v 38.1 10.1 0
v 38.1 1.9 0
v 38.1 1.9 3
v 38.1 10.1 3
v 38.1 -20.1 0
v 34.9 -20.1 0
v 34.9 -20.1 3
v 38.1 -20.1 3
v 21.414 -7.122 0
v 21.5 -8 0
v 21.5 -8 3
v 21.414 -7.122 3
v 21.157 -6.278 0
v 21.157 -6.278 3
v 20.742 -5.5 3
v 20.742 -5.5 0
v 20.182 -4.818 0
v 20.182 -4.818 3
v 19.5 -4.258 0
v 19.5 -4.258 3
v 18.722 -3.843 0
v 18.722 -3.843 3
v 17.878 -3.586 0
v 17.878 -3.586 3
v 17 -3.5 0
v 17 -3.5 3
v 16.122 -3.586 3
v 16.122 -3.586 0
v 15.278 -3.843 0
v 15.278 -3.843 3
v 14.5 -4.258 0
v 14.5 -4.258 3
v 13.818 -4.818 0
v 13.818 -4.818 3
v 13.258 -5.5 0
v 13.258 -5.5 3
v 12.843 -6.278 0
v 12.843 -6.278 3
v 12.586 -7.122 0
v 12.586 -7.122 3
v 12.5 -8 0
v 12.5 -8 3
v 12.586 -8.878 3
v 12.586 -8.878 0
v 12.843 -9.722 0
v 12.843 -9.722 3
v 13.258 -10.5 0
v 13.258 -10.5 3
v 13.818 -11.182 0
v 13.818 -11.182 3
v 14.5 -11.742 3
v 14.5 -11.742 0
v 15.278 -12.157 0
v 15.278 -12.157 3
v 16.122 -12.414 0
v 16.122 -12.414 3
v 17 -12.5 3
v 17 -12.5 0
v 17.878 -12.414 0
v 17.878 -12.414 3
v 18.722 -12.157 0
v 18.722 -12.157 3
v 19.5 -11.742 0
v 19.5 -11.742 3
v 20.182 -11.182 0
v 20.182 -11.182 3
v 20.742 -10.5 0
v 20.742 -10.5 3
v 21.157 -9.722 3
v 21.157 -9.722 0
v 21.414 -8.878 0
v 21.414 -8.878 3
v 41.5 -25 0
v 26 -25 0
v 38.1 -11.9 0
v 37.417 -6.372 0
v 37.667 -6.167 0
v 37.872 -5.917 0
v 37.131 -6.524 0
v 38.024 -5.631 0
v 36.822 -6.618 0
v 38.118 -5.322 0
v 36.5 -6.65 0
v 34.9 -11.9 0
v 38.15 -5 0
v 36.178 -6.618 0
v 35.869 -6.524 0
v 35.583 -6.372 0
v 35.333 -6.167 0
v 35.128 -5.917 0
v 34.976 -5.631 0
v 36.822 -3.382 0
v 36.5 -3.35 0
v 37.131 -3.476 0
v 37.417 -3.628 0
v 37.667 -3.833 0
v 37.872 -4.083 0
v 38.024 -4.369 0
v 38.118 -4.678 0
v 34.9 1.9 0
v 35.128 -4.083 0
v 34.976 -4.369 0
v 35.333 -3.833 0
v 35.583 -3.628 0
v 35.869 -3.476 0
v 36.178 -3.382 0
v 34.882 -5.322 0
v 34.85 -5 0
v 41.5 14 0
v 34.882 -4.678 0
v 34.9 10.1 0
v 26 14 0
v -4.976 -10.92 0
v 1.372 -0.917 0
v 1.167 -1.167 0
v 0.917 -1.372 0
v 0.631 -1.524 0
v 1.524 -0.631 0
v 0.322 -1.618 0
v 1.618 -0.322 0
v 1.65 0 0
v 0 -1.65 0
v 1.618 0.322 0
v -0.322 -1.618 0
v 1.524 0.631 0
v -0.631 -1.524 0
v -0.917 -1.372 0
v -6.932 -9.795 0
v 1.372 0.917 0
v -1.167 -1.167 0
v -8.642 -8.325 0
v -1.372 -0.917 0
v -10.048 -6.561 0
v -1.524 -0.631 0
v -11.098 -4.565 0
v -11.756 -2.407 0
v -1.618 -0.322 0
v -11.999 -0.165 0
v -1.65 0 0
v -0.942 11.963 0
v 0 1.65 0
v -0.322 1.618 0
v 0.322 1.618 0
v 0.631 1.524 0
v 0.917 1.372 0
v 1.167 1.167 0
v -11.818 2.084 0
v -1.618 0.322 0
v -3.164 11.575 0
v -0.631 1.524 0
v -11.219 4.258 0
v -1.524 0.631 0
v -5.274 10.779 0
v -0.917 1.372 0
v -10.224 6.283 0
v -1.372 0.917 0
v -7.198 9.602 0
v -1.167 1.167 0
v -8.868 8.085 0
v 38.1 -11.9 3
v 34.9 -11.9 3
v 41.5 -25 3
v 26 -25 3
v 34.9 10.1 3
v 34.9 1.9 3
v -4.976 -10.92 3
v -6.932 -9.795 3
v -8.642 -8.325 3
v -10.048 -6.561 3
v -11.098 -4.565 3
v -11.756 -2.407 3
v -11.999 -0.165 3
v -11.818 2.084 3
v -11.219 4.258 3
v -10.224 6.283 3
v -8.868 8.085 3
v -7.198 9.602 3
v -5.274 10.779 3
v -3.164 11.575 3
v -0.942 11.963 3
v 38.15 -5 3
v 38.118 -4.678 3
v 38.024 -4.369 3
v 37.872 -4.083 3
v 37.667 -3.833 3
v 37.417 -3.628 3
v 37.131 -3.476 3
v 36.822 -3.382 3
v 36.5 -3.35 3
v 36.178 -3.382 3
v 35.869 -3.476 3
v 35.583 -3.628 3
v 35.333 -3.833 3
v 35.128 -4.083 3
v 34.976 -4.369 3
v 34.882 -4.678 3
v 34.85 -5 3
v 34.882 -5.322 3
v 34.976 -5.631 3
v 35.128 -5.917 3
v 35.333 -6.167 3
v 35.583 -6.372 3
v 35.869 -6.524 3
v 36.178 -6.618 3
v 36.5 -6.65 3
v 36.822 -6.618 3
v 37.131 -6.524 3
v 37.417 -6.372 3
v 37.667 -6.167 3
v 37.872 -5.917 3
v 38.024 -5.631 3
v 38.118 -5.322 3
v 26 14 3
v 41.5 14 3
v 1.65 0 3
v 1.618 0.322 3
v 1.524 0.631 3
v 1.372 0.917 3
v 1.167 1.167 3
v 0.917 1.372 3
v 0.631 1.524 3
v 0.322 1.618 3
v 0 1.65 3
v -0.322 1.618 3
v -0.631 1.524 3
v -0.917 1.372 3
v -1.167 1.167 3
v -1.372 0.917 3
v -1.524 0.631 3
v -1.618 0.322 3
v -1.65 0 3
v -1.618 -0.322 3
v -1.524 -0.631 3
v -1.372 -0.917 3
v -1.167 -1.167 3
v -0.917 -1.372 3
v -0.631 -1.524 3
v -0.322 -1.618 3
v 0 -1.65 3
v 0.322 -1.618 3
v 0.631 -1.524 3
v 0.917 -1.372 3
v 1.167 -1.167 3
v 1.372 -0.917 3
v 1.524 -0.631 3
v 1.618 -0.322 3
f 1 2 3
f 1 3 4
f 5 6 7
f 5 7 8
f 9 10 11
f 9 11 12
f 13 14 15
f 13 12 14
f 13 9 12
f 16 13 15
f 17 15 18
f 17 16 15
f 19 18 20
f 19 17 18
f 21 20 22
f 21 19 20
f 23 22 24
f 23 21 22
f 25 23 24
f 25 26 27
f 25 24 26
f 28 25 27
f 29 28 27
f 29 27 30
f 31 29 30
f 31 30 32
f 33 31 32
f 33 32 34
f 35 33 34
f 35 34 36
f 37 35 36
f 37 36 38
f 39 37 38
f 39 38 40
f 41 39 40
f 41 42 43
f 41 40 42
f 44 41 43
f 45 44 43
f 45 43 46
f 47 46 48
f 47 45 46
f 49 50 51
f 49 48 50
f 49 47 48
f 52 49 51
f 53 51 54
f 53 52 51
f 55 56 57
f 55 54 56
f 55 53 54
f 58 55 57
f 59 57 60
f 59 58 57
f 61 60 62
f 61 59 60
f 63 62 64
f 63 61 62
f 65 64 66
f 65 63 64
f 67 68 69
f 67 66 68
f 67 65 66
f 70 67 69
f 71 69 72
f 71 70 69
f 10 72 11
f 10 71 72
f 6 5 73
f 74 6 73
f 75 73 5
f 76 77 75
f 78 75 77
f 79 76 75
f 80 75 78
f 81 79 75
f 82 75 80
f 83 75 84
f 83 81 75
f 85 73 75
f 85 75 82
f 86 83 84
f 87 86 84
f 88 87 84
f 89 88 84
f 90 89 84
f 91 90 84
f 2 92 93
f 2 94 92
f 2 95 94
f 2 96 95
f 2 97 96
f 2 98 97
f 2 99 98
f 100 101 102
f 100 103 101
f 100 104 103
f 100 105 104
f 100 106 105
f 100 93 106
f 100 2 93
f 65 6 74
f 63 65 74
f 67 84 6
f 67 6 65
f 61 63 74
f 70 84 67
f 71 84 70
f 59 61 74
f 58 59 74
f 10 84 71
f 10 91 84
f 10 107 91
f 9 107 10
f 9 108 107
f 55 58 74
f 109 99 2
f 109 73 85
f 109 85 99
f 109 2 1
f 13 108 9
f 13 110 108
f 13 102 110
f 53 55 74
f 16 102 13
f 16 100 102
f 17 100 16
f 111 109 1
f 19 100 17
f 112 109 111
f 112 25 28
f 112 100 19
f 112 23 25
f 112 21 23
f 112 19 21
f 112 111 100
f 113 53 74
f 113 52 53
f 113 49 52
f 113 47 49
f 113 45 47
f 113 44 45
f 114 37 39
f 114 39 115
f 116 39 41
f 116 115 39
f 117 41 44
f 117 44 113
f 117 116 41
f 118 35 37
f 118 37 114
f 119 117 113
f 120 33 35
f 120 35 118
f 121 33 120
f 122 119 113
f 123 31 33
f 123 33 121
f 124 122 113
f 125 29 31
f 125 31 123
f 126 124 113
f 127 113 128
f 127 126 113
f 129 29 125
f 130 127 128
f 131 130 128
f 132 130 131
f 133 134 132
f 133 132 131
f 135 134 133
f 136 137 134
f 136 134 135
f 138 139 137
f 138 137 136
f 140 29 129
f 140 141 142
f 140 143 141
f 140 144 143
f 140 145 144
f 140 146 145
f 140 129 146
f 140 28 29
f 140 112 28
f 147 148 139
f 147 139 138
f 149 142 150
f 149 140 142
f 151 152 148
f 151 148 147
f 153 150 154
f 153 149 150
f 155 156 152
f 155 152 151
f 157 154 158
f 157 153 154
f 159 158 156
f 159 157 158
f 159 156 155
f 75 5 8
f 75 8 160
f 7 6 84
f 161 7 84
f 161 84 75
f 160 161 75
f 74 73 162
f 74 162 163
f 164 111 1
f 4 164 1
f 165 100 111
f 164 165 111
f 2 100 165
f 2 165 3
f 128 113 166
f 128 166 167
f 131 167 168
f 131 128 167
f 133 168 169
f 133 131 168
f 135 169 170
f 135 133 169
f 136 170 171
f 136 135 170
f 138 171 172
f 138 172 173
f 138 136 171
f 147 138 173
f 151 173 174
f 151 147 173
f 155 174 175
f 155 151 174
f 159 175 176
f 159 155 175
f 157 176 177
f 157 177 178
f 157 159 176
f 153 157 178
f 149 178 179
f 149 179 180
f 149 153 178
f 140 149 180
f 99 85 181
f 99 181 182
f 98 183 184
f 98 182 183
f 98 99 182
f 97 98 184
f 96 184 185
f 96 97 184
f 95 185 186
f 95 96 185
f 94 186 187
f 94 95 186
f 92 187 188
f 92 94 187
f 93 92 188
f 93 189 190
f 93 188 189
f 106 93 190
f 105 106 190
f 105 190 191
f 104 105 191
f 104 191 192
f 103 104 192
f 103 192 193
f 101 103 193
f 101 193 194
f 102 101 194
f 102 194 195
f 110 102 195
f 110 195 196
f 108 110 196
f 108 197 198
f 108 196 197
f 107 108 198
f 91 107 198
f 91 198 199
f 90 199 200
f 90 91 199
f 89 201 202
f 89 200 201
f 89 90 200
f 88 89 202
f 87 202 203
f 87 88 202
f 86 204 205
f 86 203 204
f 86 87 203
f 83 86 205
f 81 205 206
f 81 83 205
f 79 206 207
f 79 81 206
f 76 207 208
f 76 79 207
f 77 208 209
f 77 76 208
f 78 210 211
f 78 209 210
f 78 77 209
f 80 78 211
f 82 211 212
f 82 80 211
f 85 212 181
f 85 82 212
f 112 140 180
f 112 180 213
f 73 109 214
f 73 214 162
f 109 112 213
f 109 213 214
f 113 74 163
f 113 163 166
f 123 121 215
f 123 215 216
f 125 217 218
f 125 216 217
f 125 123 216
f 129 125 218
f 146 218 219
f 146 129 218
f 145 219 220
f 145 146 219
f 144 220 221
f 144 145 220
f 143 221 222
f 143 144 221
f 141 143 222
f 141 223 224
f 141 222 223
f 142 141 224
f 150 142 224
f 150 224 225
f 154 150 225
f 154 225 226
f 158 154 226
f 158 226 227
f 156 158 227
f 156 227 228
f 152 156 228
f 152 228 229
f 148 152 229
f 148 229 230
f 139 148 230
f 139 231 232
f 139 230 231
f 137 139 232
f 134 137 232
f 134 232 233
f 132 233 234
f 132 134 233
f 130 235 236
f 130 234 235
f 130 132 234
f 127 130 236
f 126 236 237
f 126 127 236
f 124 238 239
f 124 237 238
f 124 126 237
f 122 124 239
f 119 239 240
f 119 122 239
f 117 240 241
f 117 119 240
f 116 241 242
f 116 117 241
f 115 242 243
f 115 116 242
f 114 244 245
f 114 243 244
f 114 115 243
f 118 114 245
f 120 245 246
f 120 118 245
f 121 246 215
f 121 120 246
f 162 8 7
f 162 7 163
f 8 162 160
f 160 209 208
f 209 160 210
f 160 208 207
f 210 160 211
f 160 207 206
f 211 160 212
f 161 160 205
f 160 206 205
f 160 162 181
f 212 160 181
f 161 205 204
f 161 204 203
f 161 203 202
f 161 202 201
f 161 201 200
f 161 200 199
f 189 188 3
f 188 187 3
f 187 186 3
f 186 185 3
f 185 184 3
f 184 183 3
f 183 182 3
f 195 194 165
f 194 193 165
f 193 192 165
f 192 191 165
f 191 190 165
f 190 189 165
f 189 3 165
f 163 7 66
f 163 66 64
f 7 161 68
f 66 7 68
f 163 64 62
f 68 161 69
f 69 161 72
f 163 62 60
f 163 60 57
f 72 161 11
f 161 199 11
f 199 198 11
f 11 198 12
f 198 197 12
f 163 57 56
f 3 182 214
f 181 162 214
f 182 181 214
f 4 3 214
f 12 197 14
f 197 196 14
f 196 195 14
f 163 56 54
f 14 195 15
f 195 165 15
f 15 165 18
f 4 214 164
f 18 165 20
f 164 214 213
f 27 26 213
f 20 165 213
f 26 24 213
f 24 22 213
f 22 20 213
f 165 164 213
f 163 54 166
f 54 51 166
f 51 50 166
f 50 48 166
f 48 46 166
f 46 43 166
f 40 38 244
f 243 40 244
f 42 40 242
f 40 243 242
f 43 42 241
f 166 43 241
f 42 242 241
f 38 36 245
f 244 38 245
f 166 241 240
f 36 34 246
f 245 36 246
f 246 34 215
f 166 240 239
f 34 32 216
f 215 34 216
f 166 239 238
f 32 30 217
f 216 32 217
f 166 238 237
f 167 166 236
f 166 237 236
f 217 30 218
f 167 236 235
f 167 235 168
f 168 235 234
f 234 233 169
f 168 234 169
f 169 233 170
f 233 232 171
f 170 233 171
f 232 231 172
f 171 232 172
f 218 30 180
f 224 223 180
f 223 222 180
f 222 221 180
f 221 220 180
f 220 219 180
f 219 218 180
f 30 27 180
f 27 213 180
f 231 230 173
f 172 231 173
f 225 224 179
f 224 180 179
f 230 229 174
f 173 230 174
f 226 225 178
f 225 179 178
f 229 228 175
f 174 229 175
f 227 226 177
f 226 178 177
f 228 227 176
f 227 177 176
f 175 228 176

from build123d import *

# Parameters (mm, degrees)
ESKIZ_KONTUR_W        = 3.2
ESKIZ_KONTUR_H        = 8.2
PLASTINA_DEPTH        = 3
OTVERSTIYA_DEPTH      = 49.541218109
OTVERSTIYA_DEPTH_BACK = 49.541218109
ESKIZ_OTVERSTIYA_R    = 4.5
ESKIZ_OTVERSTIYA_R_2  = 1.65


with BuildPart() as part:
    # Eskiz_kontur → Plastina (new body)
    with BuildSketch(Plane.XY):
        with BuildLine():
            Line((41.499998426, -24.999999723), (25.999998426, -24.999999723))
            Line((25.999998426, -24.999999723), (-4.976321574, -10.919529723))
            ThreePointArc((-4.976321574, -10.919529723), (-11.817691954, 2.083782335), (-0.94151, 11.96301))
            Line((-0.94151, 11.96301), (26, 14))
            Line((26, 14), (41.499998426, 14))
            Line((41.499998426, 14), (41.499998426, -24.999999723))
        make_face()
        with Locations((36.5, -16)):
            Rectangle(ESKIZ_KONTUR_W, ESKIZ_KONTUR_H, mode=Mode.SUBTRACT)
        with Locations((36.5, 6)):
            Rectangle(ESKIZ_KONTUR_W, ESKIZ_KONTUR_H, mode=Mode.SUBTRACT)
    extrude(amount=PLASTINA_DEPTH)

    # Eskiz_otverstiya → Otverstiya (cut, two sides: drawn at the far end of the back side and taken through both)
    with BuildSketch(Plane.XY.offset(-OTVERSTIYA_DEPTH_BACK)):
        with Locations((17, -8)):
            Circle(ESKIZ_OTVERSTIYA_R)
        Circle(ESKIZ_OTVERSTIYA_R_2)
        with Locations((36.5, -5)):
            Circle(ESKIZ_OTVERSTIYA_R_2)
    extrude(amount=OTVERSTIYA_DEPTH + OTVERSTIYA_DEPTH_BACK, mode=Mode.SUBTRACT)


solid = part.part
